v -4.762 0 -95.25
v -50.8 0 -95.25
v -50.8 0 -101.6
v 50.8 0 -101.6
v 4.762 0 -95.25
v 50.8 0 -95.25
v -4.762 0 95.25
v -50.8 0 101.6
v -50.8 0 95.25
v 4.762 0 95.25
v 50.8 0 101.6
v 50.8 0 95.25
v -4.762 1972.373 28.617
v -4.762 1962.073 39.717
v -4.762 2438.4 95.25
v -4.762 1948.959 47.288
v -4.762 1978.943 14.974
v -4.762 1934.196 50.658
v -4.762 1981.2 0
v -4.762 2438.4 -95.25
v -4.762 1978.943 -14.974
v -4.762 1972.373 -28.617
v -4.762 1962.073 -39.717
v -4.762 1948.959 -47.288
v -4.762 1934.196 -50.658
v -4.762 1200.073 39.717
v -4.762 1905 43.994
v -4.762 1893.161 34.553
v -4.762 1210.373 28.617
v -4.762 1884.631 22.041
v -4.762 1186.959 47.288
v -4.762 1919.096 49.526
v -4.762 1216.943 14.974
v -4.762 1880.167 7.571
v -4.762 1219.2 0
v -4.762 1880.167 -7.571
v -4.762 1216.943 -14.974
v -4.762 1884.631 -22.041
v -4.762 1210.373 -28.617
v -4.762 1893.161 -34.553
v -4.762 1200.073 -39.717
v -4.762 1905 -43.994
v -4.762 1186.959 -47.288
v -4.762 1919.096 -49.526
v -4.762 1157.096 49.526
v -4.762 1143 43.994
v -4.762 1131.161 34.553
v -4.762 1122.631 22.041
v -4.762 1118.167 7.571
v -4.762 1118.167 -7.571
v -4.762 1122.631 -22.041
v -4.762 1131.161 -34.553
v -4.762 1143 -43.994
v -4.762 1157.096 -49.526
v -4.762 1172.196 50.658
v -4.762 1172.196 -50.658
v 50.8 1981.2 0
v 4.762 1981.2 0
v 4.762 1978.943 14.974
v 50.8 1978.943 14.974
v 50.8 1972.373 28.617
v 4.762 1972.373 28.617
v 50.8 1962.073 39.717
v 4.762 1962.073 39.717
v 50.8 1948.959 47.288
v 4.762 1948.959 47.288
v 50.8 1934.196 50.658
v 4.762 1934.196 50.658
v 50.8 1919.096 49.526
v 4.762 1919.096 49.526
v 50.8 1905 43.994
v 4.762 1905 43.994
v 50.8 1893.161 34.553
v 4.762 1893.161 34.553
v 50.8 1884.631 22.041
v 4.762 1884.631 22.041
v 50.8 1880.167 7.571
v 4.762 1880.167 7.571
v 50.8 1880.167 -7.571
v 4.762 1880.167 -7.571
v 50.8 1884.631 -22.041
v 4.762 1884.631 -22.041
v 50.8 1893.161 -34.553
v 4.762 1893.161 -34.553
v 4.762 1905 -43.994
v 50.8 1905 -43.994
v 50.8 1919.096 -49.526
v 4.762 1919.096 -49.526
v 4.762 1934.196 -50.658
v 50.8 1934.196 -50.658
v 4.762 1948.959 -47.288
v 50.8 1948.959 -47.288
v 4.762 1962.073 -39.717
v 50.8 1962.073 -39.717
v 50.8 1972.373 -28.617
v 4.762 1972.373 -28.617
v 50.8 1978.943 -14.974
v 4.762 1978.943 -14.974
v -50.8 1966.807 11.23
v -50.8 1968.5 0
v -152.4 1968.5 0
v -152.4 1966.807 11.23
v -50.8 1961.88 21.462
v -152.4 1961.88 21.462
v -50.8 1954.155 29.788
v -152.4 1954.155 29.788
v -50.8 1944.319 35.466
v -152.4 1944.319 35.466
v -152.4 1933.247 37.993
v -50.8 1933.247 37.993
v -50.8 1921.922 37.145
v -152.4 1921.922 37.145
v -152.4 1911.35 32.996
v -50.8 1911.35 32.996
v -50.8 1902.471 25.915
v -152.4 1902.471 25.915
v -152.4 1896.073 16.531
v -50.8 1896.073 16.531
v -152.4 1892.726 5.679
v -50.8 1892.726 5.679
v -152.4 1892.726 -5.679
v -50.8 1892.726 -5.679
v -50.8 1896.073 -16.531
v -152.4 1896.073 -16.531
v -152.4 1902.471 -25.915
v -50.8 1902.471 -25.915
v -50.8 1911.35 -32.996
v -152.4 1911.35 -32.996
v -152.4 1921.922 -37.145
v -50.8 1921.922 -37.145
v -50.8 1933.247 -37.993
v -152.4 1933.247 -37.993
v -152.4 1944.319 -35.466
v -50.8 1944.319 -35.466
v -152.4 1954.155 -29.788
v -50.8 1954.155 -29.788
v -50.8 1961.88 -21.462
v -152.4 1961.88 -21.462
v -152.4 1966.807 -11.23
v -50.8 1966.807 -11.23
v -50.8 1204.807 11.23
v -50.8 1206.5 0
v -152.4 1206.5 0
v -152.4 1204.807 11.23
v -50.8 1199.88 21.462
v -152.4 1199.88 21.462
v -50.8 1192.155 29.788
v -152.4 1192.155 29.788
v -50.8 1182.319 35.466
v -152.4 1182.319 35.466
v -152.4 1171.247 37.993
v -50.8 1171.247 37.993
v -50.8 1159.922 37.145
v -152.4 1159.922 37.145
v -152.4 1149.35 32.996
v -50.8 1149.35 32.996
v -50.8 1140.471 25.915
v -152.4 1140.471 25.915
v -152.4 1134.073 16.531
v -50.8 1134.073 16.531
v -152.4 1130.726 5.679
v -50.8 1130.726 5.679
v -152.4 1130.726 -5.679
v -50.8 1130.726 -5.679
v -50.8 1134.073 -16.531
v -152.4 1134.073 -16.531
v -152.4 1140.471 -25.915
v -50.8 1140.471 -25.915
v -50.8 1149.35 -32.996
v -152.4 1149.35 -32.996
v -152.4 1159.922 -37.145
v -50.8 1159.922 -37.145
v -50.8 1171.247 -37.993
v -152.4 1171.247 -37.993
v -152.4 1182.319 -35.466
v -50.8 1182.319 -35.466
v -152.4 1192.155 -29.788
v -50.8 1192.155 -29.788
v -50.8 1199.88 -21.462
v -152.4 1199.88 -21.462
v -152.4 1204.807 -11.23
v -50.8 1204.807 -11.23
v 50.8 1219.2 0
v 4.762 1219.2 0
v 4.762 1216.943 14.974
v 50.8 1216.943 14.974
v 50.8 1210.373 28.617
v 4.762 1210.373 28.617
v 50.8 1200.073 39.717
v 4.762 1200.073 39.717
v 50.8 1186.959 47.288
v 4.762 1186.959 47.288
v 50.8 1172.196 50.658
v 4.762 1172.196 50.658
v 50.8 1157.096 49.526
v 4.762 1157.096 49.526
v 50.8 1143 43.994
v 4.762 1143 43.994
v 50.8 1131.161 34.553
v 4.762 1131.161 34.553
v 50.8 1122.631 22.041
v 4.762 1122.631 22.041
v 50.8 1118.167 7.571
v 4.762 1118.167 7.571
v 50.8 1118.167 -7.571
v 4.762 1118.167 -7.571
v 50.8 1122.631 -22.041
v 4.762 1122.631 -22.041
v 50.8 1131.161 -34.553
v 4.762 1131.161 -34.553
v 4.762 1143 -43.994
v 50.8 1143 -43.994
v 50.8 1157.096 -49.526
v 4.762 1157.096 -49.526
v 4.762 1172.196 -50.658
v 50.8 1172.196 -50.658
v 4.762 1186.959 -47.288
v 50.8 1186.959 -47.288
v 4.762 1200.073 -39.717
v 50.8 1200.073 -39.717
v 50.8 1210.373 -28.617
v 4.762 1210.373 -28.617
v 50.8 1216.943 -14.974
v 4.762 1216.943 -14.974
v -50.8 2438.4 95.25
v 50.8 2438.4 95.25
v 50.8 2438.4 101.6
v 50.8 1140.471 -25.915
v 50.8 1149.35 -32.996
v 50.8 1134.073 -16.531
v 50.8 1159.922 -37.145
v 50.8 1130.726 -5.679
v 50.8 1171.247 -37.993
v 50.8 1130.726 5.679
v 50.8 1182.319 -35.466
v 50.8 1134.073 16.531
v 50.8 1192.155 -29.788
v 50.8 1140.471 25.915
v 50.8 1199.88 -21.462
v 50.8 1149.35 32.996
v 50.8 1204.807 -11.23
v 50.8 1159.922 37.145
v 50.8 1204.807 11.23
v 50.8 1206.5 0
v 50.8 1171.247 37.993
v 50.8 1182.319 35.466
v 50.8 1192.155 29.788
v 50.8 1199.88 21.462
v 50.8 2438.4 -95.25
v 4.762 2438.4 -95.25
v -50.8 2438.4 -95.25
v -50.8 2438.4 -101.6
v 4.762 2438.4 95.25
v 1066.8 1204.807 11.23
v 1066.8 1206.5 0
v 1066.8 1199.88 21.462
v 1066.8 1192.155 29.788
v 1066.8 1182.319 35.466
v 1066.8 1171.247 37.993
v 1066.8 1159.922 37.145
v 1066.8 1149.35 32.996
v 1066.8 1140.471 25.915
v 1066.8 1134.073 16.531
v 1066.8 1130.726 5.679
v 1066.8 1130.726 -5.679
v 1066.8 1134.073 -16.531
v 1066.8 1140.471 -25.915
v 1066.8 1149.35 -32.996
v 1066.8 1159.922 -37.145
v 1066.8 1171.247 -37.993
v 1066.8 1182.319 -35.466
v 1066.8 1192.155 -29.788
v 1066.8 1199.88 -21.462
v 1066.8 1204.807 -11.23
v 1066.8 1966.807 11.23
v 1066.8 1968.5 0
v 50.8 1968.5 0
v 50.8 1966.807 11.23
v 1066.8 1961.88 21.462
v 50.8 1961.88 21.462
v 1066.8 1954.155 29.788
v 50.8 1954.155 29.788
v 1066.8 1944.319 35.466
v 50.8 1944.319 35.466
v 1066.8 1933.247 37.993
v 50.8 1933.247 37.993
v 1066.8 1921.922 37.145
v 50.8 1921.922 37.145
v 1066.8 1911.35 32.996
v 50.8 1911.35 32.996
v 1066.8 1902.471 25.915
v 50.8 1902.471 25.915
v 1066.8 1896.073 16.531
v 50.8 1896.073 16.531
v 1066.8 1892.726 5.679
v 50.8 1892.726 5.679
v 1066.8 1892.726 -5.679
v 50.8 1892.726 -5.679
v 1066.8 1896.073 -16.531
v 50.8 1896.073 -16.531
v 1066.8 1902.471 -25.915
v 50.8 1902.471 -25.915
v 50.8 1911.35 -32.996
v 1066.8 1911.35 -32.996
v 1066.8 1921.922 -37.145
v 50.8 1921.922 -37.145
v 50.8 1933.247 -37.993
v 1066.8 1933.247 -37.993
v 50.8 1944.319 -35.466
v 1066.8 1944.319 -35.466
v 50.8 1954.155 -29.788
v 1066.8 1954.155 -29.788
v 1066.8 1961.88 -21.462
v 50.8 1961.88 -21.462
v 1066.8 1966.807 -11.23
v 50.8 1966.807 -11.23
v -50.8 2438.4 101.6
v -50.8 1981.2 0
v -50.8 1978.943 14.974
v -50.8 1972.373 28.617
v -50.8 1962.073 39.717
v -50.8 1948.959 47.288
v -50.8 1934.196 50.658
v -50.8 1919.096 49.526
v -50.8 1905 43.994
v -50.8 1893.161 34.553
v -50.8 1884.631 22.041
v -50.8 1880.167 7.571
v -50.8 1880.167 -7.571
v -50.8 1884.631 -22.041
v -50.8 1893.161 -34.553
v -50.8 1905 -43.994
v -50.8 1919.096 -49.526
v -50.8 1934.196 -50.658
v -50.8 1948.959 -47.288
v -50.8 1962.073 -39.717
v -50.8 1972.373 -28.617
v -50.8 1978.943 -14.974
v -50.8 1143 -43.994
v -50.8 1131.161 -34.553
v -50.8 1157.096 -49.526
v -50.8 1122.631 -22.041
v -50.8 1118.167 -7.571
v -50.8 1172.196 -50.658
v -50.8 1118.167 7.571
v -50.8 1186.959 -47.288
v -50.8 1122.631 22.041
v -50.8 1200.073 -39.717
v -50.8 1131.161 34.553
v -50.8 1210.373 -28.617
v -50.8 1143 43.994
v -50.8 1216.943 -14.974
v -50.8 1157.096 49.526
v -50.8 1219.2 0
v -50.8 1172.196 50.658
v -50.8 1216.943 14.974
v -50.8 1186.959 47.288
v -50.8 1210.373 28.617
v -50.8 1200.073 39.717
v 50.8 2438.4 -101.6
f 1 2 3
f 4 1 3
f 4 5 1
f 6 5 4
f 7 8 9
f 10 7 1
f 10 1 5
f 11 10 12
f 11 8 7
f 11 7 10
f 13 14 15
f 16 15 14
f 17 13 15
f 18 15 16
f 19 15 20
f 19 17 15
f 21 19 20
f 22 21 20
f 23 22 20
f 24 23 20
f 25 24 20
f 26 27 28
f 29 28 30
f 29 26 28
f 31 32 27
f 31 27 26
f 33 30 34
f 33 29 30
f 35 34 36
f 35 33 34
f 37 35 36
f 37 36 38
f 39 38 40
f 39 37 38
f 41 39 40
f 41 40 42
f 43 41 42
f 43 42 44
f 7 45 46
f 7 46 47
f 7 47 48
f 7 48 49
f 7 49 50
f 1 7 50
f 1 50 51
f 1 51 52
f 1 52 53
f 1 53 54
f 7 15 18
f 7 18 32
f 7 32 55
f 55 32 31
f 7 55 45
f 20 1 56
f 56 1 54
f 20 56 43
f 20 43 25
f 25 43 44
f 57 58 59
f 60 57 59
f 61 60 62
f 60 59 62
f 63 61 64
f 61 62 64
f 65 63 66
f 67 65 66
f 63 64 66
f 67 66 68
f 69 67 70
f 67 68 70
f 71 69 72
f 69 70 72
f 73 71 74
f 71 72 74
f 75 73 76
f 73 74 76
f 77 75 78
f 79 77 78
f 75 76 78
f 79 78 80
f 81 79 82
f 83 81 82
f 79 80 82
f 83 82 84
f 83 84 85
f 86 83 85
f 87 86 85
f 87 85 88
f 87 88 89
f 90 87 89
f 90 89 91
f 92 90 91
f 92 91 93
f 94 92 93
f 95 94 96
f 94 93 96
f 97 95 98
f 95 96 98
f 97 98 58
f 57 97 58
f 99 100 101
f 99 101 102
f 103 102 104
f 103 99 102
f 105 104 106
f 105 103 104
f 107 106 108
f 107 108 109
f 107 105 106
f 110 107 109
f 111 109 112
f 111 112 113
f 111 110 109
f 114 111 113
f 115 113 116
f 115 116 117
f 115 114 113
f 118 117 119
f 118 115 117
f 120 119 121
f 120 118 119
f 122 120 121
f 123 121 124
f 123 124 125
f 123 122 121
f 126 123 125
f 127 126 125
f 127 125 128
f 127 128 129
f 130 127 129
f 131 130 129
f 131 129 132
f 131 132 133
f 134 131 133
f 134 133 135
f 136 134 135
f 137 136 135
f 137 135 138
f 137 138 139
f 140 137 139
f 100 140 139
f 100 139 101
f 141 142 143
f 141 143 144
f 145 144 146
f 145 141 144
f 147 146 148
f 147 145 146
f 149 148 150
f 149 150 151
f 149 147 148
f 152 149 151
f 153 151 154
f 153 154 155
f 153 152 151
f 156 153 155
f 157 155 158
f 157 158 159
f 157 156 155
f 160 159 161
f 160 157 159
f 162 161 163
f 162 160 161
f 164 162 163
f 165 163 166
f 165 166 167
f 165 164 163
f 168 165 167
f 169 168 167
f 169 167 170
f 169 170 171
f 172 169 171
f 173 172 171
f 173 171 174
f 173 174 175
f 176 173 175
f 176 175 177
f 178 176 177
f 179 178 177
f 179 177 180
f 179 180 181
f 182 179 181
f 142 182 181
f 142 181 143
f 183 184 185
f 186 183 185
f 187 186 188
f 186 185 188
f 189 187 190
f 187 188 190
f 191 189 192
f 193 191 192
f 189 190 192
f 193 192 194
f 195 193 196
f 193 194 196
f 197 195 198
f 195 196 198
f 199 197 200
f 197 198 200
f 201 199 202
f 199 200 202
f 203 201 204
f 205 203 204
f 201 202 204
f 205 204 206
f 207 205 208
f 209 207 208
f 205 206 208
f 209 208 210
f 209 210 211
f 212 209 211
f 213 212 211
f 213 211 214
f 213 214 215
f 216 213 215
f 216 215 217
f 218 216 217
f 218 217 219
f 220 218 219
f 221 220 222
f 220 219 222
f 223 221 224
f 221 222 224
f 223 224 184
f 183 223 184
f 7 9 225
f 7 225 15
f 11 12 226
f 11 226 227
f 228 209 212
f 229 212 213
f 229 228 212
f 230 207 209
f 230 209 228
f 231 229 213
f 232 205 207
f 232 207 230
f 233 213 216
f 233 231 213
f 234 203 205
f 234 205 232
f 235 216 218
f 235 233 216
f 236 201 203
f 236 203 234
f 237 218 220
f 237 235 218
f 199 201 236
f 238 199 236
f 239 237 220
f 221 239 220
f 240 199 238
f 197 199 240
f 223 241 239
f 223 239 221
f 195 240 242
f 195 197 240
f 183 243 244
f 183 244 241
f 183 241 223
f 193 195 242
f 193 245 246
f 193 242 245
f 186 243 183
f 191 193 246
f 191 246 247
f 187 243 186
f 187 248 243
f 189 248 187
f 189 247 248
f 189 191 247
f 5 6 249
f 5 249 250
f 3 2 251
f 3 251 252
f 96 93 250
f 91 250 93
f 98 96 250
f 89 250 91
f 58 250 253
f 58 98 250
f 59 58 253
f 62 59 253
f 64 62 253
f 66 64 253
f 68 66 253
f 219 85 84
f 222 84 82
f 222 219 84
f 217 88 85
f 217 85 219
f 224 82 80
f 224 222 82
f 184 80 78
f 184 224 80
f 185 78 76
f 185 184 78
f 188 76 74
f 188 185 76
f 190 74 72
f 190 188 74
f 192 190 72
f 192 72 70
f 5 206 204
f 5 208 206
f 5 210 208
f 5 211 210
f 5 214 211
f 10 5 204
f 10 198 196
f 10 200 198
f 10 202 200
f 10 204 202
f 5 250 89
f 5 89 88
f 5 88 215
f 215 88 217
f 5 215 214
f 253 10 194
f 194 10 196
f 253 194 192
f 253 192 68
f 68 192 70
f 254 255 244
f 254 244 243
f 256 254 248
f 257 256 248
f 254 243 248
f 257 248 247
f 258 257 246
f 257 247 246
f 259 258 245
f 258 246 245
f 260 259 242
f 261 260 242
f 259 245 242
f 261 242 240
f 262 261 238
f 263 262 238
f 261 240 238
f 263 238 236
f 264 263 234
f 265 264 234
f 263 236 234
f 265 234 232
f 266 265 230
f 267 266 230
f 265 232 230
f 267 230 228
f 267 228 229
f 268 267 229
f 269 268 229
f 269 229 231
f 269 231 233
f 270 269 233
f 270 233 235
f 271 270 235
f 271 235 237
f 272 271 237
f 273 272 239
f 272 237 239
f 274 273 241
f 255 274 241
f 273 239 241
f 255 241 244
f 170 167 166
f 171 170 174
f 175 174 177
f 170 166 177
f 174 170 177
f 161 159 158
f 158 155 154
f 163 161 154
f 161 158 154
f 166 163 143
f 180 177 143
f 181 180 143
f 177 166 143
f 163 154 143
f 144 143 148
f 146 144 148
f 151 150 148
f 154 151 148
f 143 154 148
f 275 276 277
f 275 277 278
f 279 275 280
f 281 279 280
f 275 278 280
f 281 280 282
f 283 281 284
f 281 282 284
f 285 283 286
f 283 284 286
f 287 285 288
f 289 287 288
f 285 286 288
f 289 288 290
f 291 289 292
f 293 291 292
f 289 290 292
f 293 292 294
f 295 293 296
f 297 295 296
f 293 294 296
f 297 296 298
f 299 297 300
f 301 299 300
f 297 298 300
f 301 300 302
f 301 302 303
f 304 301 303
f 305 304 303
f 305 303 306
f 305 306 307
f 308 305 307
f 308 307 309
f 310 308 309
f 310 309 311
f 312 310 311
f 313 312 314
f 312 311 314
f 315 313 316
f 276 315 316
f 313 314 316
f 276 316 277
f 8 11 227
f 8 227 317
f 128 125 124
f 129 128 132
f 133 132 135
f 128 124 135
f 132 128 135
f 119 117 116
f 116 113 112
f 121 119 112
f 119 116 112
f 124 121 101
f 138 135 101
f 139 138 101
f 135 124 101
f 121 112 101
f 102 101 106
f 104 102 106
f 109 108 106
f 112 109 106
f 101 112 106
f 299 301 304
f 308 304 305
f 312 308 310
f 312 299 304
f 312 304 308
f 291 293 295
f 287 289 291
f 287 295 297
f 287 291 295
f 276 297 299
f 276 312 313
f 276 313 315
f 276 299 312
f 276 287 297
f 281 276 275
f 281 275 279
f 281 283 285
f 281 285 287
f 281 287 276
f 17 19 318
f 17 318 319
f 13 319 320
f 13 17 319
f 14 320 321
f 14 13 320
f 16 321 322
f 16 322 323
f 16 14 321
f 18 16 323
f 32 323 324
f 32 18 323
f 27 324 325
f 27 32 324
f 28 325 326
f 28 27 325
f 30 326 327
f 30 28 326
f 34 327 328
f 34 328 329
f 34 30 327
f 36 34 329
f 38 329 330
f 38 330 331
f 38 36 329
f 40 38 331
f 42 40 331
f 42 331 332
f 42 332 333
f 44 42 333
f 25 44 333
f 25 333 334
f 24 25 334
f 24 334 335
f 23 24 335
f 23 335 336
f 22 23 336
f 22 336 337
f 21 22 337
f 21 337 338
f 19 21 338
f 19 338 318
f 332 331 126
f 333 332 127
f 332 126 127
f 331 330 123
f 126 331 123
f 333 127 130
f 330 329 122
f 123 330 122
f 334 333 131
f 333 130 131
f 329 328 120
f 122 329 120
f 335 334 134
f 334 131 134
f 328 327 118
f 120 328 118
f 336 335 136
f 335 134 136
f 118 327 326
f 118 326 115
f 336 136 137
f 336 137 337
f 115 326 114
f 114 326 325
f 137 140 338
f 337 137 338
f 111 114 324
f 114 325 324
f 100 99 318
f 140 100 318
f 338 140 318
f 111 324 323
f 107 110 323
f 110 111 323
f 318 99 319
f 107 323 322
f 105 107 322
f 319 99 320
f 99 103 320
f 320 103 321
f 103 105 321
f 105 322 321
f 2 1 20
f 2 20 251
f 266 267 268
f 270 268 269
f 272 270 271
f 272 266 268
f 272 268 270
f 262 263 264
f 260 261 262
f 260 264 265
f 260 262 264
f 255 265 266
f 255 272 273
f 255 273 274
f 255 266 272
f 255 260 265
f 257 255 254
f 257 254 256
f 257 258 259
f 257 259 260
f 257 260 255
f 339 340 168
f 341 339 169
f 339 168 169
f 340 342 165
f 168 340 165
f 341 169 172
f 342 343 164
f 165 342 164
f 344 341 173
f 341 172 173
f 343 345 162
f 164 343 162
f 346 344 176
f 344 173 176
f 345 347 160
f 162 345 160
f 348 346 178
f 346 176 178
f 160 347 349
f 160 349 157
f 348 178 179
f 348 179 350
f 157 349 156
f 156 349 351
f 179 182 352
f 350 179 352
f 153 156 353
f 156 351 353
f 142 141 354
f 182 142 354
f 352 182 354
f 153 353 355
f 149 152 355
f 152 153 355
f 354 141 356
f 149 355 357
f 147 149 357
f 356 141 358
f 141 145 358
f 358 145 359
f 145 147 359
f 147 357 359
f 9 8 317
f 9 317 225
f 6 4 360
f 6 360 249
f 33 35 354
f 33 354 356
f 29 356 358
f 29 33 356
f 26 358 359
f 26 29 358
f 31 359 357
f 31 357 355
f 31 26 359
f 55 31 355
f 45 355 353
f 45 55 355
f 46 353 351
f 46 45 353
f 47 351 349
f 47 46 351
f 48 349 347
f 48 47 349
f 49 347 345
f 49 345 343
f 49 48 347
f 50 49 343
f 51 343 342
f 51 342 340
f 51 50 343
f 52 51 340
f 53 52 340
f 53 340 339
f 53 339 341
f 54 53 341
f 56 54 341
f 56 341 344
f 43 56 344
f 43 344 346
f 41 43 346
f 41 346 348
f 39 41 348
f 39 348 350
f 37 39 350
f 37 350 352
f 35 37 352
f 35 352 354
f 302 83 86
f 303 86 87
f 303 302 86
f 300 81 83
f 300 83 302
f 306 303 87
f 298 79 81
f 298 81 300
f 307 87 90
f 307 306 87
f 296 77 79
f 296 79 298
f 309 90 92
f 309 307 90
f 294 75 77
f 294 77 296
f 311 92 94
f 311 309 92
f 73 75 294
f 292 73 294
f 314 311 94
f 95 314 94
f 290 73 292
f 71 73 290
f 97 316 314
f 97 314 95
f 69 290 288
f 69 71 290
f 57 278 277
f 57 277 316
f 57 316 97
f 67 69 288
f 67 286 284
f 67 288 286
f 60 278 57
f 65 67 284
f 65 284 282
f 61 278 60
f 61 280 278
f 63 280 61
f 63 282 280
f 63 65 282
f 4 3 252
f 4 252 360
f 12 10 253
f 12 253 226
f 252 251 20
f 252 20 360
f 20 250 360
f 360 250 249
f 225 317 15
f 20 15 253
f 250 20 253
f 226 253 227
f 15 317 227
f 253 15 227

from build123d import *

# Parameters (mm, degrees)
F1_DEPTH      = 2438.4
F2_R          = 50.8
F3_DEPTH      = 55.5635
F4_R          = 50.8
F4_R_2        = 38.1
F5_DEPTH      = 46.0375
F5_DEPTH_BACK = 55.5625
F6_R          = 38.1
F7_DEPTH      = 1016
F7_DEPTH_BACK = 203.2


with BuildPart() as f1:
    # F0 (on Front) → F1 (new body)
    with BuildSketch(Plane.XZ):
        Polygon((-50.8, -101.6), (50.8, -101.6), (50.8, -95.25), (4.7625, -95.25), (4.7625, 95.25), (50.8, 95.25), (50.8, 101.6), (-50.8, 101.6), (-50.8, 95.25), (-4.7625, 95.25), (-4.7625, -95.25), (-50.8, -95.25), align=None)
    extrude(amount=-F1_DEPTH)

    # F2 (on face) → F3 (cut, through all)
    with BuildSketch(Plane.YZ.offset(4.7625)):
        with Locations((1168.4, 0)):
            Circle(F2_R)
        with Locations((1930.4, 0)):
            Circle(F2_R)
    extrude(amount=-F3_DEPTH, mode=Mode.SUBTRACT)

    # F4 (on face) → F5 (join, two sides)
    with BuildSketch(Plane.YZ.offset(4.7625)) as f5_sk:
        with Locations((1168.4, 0)):
            Circle(F4_R)
        with Locations((1168.4, 0)):
            Circle(F4_R_2, mode=Mode.SUBTRACT)
        with Locations((1930.4, 0)):
            Circle(F4_R)
        with Locations((1930.4, 0)):
            Circle(F4_R_2, mode=Mode.SUBTRACT)
    extrude(amount=F5_DEPTH)
    extrude(f5_sk.sketch, amount=-F5_DEPTH_BACK)

    # F6 (on face) → F7 (join, two sides)
    with BuildSketch(Plane.YZ.offset(50.8)) as f7_sk:
        with Locations((1168.4, 0)):
            Circle(F6_R)
        with Locations((1930.4, 0)):
            Circle(F6_R)
    extrude(amount=F7_DEPTH)
    extrude(f7_sk.sketch, amount=-F7_DEPTH_BACK)


solid = f1.part
